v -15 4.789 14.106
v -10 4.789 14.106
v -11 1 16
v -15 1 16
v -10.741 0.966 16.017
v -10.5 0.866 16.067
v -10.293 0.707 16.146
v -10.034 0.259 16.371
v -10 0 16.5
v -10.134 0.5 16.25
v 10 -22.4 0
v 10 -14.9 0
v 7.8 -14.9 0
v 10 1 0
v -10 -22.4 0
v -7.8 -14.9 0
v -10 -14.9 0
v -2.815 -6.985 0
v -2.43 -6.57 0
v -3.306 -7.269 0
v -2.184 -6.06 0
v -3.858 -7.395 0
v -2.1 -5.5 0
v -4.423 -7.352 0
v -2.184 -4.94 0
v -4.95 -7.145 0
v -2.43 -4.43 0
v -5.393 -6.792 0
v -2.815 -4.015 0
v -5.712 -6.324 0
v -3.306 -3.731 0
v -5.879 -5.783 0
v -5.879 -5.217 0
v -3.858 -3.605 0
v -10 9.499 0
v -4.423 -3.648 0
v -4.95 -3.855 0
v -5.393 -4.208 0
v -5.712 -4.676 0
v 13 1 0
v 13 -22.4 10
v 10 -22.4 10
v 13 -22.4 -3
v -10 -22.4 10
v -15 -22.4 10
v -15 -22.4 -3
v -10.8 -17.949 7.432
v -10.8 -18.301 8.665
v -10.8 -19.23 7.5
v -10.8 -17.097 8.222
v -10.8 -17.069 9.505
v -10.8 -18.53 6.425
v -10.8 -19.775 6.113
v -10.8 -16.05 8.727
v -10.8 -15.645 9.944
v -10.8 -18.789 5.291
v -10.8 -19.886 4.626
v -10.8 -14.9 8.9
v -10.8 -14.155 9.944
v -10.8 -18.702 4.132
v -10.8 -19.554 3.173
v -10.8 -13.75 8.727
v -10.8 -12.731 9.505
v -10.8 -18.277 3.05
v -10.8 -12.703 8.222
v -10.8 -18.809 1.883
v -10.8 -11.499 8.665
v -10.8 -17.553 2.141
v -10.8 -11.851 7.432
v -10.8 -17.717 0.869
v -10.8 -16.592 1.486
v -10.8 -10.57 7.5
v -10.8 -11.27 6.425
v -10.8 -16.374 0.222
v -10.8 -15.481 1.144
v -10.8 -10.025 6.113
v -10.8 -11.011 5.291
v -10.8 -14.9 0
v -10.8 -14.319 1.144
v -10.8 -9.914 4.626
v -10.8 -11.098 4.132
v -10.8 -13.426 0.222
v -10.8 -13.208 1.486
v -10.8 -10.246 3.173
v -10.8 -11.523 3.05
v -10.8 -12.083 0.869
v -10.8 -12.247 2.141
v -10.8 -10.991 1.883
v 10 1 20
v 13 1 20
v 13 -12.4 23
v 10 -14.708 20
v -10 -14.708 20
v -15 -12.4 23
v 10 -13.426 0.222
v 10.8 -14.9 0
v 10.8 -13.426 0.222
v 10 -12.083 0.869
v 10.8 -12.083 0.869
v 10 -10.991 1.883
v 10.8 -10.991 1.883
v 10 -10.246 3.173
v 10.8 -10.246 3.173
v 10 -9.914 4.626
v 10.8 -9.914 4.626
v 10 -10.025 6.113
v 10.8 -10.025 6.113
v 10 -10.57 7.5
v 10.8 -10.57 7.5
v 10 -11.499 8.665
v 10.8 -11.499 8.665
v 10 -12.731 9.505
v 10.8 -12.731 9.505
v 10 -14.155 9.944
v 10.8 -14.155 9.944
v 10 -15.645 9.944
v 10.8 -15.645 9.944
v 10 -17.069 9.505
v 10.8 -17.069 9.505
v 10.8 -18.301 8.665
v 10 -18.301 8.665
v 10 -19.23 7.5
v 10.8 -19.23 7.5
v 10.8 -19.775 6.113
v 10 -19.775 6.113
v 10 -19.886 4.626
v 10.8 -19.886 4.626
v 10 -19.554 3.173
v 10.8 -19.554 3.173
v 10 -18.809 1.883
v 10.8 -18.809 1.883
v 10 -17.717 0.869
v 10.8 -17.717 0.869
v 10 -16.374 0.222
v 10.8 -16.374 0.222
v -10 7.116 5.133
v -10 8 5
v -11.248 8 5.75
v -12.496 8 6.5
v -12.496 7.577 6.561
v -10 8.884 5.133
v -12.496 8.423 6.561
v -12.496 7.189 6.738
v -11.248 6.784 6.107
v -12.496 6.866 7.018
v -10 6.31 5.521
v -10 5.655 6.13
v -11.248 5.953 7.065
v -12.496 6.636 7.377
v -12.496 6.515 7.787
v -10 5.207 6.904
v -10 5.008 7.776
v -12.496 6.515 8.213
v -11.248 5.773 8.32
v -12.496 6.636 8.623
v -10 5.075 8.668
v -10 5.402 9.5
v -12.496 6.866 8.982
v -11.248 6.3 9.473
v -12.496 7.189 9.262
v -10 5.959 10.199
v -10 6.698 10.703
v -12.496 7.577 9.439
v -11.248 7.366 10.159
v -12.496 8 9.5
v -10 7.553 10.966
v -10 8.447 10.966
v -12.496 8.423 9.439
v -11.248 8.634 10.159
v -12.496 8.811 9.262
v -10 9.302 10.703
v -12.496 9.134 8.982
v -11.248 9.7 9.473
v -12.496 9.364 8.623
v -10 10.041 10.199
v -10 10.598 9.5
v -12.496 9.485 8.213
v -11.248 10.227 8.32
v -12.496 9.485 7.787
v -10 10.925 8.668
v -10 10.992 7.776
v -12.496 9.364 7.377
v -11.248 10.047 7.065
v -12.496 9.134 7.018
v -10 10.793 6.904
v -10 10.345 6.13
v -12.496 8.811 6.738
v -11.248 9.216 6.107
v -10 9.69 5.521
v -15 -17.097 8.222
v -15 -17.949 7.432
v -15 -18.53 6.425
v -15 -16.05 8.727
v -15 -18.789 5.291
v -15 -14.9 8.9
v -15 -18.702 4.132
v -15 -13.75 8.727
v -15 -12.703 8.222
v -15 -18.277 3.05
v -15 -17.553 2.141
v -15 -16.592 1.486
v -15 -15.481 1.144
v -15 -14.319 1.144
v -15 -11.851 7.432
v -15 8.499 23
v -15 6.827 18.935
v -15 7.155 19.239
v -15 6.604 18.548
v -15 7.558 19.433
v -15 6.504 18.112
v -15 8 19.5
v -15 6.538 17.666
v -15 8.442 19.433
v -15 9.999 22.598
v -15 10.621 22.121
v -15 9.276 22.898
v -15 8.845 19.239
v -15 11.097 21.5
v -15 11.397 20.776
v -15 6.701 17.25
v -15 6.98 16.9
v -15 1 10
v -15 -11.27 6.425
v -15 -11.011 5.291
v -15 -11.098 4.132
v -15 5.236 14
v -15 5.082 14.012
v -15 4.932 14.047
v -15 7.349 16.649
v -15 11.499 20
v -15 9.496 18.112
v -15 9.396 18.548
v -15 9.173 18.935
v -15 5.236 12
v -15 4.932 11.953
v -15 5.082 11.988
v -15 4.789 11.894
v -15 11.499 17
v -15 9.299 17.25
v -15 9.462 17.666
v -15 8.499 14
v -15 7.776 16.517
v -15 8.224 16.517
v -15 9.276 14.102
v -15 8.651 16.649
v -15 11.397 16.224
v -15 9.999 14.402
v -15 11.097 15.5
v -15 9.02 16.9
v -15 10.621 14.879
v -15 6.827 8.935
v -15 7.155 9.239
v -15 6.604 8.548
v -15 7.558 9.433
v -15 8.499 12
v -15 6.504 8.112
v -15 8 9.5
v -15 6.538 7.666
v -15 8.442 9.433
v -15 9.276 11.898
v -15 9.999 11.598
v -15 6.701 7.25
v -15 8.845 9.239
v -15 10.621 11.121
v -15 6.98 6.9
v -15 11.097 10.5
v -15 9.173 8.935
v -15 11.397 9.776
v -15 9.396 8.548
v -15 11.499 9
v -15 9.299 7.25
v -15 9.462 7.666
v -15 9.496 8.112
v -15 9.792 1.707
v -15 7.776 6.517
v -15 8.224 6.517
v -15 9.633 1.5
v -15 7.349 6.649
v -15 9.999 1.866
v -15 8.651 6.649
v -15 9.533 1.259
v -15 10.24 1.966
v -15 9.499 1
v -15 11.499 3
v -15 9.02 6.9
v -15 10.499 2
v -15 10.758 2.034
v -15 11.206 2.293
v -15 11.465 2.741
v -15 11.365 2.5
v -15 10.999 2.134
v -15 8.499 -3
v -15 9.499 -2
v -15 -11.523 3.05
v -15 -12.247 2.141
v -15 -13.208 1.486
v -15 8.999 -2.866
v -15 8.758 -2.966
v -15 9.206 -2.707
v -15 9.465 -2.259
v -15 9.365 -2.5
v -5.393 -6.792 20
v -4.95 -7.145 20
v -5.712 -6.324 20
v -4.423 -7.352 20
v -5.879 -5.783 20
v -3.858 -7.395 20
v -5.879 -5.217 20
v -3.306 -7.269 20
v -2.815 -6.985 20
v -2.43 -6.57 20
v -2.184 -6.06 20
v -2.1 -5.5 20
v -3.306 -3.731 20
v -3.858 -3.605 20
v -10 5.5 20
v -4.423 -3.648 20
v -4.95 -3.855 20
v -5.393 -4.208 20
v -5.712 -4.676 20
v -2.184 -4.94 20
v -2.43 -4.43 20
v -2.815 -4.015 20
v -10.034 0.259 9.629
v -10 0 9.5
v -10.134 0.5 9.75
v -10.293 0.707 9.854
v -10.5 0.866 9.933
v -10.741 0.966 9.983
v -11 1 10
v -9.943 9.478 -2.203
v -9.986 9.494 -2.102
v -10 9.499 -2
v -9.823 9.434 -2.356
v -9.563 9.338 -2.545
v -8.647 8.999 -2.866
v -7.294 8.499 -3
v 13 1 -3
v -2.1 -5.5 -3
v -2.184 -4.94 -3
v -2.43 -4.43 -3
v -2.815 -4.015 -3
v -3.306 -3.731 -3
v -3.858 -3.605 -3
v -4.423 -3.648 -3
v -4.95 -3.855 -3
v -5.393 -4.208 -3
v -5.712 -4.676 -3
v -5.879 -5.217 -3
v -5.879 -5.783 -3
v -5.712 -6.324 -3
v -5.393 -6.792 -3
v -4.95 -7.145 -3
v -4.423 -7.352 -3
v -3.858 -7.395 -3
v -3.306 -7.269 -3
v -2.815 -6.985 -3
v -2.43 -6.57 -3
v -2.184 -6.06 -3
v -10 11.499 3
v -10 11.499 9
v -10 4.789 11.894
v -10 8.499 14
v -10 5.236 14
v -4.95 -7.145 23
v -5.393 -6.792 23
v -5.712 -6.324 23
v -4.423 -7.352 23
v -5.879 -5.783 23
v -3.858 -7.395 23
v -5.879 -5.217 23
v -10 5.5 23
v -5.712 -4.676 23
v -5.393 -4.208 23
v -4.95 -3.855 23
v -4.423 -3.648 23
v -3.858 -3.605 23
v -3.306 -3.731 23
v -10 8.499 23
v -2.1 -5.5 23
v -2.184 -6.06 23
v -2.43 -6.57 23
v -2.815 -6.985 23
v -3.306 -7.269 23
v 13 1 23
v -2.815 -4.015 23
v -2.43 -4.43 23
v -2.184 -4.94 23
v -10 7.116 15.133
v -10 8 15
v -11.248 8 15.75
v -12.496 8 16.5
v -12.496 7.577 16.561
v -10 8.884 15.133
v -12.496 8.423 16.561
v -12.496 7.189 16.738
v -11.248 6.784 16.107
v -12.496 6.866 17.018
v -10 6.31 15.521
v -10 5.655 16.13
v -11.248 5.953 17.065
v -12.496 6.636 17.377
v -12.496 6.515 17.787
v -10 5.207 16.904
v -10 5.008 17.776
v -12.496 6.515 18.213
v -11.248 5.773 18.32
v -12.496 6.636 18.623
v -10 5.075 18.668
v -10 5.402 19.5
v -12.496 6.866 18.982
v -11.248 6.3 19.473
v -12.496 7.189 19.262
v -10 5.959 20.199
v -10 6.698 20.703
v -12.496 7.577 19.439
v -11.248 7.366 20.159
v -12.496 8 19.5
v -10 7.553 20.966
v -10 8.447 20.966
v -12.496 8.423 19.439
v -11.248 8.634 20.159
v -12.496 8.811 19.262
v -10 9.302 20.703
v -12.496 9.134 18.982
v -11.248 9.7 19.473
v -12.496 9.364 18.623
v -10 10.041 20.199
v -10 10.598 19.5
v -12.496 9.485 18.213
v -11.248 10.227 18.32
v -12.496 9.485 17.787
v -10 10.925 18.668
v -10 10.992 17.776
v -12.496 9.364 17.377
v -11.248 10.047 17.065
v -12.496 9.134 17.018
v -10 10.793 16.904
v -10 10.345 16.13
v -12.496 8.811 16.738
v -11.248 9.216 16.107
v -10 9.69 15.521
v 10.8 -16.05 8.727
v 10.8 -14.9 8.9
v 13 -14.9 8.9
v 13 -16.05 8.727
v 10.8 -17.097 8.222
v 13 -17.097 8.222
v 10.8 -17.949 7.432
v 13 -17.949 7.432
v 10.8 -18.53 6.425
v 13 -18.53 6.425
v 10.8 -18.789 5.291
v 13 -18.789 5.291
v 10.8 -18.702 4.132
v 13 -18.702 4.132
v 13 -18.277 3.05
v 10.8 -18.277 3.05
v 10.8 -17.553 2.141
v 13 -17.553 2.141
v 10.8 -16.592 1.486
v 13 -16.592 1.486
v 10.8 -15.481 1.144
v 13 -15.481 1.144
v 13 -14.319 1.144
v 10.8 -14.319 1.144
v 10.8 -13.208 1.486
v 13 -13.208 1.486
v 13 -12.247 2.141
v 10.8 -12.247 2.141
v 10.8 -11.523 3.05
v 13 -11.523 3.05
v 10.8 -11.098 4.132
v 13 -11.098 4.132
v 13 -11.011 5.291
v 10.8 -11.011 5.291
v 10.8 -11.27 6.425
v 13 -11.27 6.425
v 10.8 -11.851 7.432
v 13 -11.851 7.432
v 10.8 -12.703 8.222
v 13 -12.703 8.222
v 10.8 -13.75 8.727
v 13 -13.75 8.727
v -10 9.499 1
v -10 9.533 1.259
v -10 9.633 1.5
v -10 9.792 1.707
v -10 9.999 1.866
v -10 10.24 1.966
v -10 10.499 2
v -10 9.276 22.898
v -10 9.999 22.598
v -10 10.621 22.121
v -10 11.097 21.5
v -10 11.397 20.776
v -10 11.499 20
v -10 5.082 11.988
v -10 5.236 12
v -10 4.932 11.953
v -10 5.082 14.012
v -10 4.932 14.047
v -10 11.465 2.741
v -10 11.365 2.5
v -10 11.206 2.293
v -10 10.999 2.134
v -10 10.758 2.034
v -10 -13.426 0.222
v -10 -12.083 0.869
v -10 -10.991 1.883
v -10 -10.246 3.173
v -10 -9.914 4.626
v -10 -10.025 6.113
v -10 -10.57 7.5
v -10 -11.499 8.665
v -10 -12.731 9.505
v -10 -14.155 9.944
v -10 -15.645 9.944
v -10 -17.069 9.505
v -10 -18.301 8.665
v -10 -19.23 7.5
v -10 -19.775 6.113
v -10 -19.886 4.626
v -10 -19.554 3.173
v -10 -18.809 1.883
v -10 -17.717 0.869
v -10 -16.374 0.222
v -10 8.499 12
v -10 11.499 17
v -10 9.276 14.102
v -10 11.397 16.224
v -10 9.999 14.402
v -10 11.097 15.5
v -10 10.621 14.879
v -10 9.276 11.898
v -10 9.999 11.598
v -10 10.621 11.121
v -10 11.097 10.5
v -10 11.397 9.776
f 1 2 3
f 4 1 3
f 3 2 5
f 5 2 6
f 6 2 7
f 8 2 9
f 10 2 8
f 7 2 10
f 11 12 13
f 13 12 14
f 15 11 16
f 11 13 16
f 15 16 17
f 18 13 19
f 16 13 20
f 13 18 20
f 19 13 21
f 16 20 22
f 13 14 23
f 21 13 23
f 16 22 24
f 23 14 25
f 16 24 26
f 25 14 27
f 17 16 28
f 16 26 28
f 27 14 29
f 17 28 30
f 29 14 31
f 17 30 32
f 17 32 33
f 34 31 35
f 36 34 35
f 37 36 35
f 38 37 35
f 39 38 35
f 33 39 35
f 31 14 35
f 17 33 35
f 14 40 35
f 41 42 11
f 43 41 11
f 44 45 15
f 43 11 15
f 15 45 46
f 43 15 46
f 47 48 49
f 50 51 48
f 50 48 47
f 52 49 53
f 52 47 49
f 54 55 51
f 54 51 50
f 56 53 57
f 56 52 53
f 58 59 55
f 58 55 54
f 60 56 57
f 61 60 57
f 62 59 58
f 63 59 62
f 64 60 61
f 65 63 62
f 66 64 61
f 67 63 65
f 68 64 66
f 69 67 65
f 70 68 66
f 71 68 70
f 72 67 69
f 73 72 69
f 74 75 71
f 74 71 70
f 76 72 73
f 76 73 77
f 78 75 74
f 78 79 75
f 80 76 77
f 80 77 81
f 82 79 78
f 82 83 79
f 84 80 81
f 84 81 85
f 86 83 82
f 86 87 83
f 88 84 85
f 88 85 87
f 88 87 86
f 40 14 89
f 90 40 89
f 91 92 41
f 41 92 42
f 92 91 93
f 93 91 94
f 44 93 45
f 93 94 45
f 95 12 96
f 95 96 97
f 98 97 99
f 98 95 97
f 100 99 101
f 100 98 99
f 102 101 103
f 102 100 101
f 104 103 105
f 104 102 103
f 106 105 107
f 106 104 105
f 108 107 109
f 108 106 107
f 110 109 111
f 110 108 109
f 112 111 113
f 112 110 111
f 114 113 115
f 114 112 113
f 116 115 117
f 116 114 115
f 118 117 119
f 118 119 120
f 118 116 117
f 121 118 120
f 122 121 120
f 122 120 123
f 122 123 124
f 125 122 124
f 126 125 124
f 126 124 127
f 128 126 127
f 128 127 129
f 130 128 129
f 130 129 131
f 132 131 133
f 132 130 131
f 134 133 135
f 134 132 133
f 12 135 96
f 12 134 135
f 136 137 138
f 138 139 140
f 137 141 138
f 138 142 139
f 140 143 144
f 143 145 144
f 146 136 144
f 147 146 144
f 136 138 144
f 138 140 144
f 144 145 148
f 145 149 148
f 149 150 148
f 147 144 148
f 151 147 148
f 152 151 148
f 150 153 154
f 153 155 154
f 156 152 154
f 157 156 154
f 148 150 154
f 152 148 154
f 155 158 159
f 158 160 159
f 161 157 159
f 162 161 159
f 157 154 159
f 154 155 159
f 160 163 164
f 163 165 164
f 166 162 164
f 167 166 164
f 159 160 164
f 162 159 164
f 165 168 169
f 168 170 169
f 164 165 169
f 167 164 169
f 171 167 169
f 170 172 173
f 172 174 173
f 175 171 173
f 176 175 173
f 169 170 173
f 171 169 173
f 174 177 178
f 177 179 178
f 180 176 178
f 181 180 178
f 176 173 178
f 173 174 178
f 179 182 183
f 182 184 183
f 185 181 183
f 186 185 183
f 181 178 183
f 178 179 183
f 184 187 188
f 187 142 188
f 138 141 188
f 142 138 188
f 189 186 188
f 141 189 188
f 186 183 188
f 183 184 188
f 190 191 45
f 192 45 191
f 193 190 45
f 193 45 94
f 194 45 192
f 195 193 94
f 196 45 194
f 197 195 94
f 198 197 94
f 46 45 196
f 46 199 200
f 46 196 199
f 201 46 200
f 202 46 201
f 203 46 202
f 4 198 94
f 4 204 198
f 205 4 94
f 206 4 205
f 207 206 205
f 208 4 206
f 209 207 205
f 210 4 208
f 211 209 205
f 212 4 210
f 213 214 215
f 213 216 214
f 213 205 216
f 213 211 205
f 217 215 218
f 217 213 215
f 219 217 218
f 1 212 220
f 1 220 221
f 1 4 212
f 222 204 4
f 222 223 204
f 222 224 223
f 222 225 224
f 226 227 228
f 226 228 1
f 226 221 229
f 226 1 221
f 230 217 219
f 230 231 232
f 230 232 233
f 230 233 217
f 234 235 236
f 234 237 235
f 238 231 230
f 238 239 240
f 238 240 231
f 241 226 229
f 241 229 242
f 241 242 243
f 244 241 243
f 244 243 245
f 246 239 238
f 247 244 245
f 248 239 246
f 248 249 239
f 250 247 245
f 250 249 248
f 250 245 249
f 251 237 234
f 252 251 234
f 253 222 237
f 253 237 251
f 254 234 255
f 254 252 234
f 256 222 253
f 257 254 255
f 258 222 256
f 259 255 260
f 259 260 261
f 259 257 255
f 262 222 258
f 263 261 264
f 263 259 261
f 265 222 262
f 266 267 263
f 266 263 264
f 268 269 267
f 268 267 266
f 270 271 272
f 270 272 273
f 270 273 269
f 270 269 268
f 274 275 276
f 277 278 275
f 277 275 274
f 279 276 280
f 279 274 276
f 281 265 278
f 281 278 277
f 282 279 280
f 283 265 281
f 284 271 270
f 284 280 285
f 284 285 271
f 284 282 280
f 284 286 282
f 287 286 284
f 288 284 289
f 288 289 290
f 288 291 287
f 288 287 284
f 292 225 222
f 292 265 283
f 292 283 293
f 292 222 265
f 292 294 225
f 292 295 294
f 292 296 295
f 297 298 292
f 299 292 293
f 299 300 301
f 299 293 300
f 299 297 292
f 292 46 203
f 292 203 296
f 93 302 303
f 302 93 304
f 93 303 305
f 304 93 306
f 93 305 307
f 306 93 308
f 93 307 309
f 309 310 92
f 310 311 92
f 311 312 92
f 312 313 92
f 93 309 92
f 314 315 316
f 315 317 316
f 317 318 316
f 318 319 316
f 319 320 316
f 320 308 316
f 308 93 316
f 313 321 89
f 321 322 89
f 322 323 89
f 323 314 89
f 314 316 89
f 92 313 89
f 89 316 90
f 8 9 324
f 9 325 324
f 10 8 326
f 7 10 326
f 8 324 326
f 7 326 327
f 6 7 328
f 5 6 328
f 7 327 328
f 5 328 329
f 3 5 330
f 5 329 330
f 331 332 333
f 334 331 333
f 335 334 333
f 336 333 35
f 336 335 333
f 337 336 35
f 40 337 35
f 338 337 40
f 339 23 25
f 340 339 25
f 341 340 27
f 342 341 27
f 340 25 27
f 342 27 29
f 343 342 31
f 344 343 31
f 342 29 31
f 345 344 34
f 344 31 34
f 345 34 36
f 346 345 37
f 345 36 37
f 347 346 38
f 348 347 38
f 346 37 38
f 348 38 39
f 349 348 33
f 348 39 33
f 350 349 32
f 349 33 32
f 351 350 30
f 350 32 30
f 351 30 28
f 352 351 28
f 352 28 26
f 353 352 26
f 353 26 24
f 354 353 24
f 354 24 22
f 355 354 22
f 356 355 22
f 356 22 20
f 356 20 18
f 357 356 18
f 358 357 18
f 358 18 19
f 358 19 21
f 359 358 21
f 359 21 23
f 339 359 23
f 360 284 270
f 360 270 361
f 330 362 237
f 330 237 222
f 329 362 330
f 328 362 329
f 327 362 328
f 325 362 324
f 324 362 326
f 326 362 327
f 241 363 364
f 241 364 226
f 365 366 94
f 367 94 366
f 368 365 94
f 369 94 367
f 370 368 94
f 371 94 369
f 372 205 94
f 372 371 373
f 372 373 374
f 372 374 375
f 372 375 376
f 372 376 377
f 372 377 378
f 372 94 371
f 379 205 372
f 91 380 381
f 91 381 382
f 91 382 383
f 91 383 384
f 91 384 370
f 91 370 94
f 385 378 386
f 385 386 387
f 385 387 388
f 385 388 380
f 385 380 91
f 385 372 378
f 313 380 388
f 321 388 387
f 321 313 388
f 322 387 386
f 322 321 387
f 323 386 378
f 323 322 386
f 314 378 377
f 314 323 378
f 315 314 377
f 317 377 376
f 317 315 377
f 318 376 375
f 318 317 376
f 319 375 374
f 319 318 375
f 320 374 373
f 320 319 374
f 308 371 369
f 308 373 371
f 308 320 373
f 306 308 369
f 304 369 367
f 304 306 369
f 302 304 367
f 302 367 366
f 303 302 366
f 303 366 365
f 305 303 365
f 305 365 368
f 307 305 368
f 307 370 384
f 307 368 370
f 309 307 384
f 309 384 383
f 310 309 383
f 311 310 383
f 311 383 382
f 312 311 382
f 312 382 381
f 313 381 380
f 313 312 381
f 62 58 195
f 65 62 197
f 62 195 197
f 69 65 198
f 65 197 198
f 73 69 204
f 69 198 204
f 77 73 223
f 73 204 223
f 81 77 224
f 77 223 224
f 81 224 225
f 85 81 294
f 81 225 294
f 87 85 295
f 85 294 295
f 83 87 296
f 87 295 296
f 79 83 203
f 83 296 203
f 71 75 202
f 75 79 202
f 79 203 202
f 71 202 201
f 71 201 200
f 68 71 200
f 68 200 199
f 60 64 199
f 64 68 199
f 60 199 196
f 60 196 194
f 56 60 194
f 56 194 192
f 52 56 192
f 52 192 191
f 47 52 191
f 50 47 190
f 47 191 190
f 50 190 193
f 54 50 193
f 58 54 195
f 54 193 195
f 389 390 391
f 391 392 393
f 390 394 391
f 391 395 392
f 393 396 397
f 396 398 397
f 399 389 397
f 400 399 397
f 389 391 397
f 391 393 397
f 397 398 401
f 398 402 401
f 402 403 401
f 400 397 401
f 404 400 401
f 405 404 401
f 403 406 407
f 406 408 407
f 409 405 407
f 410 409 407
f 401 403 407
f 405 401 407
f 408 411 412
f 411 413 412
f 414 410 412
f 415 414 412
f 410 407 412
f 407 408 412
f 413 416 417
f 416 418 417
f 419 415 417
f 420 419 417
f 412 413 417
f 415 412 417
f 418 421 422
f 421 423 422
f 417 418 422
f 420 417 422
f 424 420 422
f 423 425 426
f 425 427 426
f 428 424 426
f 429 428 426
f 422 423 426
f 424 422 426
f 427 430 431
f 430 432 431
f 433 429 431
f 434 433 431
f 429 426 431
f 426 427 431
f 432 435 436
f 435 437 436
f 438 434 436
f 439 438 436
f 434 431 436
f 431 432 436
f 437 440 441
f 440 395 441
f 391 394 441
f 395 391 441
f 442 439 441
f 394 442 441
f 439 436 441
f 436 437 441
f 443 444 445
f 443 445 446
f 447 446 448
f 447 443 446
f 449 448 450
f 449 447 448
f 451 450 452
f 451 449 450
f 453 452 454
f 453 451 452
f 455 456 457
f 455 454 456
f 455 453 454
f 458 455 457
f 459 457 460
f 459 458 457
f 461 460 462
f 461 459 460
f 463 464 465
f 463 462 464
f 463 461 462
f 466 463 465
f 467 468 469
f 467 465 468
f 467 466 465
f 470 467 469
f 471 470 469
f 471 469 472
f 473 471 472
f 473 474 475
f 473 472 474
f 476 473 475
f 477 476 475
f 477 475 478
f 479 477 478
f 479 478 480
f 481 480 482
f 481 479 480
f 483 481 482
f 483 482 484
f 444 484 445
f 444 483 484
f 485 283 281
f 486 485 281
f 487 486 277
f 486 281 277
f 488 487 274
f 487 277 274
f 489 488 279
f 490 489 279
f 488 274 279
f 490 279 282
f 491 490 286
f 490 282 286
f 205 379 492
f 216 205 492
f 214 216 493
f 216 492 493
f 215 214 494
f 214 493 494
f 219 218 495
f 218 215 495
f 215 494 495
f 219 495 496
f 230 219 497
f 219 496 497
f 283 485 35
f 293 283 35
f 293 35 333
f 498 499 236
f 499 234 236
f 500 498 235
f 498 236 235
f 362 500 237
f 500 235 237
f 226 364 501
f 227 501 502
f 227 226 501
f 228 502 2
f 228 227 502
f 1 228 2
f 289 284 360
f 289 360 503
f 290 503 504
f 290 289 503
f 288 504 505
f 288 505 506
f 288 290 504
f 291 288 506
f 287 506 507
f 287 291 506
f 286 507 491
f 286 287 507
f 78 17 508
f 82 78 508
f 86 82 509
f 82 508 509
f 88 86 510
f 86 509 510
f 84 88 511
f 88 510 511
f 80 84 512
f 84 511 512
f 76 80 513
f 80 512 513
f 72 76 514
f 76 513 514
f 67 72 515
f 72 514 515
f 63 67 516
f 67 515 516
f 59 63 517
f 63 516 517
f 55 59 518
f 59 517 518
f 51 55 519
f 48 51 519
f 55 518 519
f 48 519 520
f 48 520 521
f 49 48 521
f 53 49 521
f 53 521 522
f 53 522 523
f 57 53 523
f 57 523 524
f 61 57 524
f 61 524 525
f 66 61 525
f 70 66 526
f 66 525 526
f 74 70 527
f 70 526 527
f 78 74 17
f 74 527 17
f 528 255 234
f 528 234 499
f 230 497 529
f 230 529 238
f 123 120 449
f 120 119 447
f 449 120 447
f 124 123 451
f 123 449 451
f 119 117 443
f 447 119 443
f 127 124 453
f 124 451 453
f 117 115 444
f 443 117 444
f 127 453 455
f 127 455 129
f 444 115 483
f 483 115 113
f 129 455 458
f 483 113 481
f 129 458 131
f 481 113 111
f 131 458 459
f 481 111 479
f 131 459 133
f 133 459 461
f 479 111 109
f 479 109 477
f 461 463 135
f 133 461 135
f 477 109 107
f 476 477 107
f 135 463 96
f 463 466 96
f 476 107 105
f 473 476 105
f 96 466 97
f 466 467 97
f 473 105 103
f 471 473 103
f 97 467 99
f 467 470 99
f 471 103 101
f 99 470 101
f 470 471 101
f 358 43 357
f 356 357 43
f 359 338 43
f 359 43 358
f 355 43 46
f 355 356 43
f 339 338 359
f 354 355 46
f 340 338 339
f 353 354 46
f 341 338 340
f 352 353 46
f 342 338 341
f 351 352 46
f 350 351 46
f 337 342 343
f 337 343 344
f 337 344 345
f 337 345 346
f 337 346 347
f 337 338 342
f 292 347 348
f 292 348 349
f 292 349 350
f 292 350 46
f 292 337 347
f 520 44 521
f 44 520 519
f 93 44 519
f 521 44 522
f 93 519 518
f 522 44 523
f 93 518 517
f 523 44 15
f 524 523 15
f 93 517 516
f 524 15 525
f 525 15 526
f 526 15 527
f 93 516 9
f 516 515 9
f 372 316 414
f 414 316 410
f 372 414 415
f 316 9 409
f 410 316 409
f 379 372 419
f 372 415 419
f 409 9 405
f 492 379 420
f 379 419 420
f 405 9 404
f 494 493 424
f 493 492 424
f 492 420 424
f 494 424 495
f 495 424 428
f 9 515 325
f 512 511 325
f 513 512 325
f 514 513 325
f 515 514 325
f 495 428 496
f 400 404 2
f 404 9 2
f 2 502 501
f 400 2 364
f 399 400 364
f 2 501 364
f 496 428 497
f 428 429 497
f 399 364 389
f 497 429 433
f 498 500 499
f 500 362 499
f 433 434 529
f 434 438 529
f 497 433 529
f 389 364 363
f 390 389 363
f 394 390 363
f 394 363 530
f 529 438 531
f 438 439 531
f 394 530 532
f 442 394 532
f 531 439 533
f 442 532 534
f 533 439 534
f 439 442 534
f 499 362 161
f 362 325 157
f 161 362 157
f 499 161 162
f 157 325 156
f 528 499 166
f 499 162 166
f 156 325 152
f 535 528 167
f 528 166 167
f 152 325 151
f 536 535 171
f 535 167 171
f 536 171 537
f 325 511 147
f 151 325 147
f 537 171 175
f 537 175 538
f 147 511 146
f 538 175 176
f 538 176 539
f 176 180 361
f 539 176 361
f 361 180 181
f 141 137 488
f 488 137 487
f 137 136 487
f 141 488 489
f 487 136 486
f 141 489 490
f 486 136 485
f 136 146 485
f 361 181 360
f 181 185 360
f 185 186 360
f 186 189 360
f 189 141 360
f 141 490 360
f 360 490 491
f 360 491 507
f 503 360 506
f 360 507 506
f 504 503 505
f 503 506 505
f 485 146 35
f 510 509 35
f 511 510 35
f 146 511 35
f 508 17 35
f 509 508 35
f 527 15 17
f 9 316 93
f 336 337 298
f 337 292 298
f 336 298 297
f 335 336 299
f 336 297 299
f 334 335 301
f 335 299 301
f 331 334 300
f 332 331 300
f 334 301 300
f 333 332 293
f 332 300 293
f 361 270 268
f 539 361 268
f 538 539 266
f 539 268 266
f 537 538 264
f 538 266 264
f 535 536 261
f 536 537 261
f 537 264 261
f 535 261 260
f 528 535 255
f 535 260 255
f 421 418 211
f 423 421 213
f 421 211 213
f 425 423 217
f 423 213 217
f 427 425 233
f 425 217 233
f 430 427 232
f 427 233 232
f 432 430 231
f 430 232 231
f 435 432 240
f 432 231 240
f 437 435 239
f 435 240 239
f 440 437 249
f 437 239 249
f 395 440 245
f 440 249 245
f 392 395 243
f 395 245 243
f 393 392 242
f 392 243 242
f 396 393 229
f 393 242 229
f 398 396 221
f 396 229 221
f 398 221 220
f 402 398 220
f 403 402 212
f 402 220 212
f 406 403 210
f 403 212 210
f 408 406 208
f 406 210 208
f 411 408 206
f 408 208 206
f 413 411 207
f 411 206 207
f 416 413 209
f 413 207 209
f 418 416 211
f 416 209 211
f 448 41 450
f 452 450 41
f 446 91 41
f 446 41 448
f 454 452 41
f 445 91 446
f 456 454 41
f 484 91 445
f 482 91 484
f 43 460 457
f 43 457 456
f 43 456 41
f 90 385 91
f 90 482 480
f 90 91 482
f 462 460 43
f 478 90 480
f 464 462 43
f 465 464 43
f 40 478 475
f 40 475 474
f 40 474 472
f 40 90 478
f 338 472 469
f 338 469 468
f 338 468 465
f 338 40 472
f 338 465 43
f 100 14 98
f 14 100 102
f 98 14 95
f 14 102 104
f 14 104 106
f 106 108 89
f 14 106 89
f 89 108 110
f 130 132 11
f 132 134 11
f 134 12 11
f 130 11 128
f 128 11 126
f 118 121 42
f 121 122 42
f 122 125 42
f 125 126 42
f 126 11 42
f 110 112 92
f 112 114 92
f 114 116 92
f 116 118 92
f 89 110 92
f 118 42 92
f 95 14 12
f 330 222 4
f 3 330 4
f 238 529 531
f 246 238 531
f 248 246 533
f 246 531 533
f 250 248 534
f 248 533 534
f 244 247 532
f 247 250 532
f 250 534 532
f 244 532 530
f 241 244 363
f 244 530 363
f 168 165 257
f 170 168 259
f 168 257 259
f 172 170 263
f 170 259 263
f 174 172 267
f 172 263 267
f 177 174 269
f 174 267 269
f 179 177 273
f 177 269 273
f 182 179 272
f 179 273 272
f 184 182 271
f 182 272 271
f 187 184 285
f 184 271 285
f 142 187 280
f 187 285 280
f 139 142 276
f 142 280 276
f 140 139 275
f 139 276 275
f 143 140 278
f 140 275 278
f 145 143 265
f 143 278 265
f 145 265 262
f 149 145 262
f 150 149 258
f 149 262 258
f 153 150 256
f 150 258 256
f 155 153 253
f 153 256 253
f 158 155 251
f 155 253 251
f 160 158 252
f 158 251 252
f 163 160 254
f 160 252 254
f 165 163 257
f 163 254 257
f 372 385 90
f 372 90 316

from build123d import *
from build123d.topology import SkipClean

# Parameters (mm, degrees)
SKETCH_1_W                = 20
SKETCH_1_H                = 57.76596942167697
EXTRUDE_1_DEPTH           = 3
EXTRUDE_2_DEPTH           = 3
CUT_EXTRUDE_1_DEPTH       = 6
SKETCH_8_R                = 4.48
CUT_EXTRUDE_2_DEPTH       = 0.8
SKETCH_9_R                = 1.9
CUT_EXTRUDE_3_DEPTH       = 3.8
SKETCH_12_W               = 26.000000000000007
SKETCH_12_H               = 35.36596942167698
CUT_EXTRUDE_4_DEPTH       = 36.00000000000001
CUT_EXTRUDE_8_DEPTH       = 28.00000000000001
SKETCH_23_W               = 26.000000000000004
SKETCH_23_H               = 26
SKETCH_23_W_2             = 20
SKETCH_23_H_2             = 19.999999999999993
EXTRUDE_7_DEPTH           = 4
SKETCH_24_W               = 20
SKETCH_24_H               = 19.999999999999993
EXTRUDE_8_DEPTH           = 3
SKETCH_25_W               = 5.000000000000002
SKETCH_25_H               = 16
SKETCH_25_R               = 1.4999999999999991
EXTRUDE_9_DEPTH           = 3
FILLET_1_R                = 1
CUT_EXTRUDE_9_DEPTH       = 3
SKETCH_27_R               = 1.4999999999999987
CUT_EXTRUDE_10_DEPTH      = 3
SKETCH_28_W               = 20
SKETCH_28_H               = 19.999999999999993
CUT_EXTRUDE_11_DEPTH      = 10
CUT_EXTRUDE_12_DEPTH      = 42.00000000000001
SKETCH_31_R               = 4.48
SKETCH_31_R_2             = 3.98
EXTRUDE_13_DEPTH          = 0.8
SKETCH_32_R               = 5.000000000000001
SKETCH_32_R_2             = 3.98
CUT_EXTRUDE_13_DEPTH      = 0.8
SKETCH_33_R               = 4.48
EXTRUDE_14_DEPTH          = 3
SKETCH_36_R               = 5.000000000000001
CUT_EXTRUDE_14_DEPTH      = 3
SKETCH_37_R               = 3.98
SKETCH_37_R_2             = 3.900000000000001
EXTRUDE_17_DEPTH          = 0.8
SKETCH_38_R               = 1.5000000000000009
EXTRUDE_18_DEPTH          = 3
SKETCH_39_W               = 4.187599959799879
SKETCH_39_H               = 1.3608825238343043
EXTRUDE_19_DEPTH          = 3
EXTRUDE_START             = 2
SKETCH_43_R               = 1.5000000000000024
SKETCH_43_R_2             = 1.5000000000000009
SKETCH_43_R_3             = 3.900000000000002
EXTRUDE_22_DEPTH          = 2
SKETCH_44_W               = 5
SKETCH_44_H               = 9.399224841629362
EXTRUDE_23_DEPTH          = 2
EXTRUDE_24_DEPTH          = 3
SKETCH_47_W               = 5
SKETCH_47_H               = 9.399224841629362
EXTRUDE_25_DEPTH          = 8
SKETCH_51_W               = 5
SKETCH_51_H               = 14
SKETCH_51_H_2             = 7.999999999999998
EXTRUDE_28_DEPTH          = 1.1
CUT_EXTRUDE_16_DEPTH      = 6.1000000000000005
FILLET_START              = -16
FILLET_9_DEPTH            = 7
FILLET_START_2            = -15
FILLET_9_2_DEPTH          = 5
EXTRUDE_30_DEPTH          = 3
FILLET_10_R               = 1
SKETCH_57_W               = 5
SKETCH_57_H               = 10.499224841629362
EXTRUDE_31_DEPTH          = 1
SKETCH_58_W               = 5
SKETCH_58_H               = 10.499224841629362
EXTRUDE_32_DEPTH          = 1
FILLET_11_R               = 3
CUT_EXTRUDE_19_DEPTH      = 6.500000000000001
FILLET_14_R               = 1
FILLET_19_R               = 1
HOLE_WIZARD_1_D           = 3
HOLE_WIZARD_1_DEPTH       = 5
HOLE_WIZARD_1_CSINK_D     = 6
HOLE_WIZARD_1_CSINK_ANGLE = 62


with BuildPart() as part:
    # 草图1 → 凸台-拉伸1 (new body)
    with BuildSketch(Plane.XY):
        with Locations((0, -28.882984710838485)):
            Rectangle(SKETCH_1_W, SKETCH_1_H)
    extrude_1 = extrude(amount=-EXTRUDE_1_DEPTH)

    # 草图2 → 凸台-拉伸2 (add)
    with BuildSketch(Plane.ZY.offset(10)):
        Polygon((-3, -1.22e-15), (23, 0), (23.000000000000007, -57.76596942167697), (-3, -57.76596942167697), align=None)
    extrude_2 = extrude(amount=EXTRUDE_2_DEPTH)

    # 草图7 → 切除-拉伸1 (cut)
    with BuildSketch(Plane(origin=(-10, 0, 0), x_dir=(0, 0, -1), z_dir=(1, 0, 0))):
        with BuildLine():
            ThreePointArc((-1.0999999999999996, -14.899999999999997), (-5, -10.999999999999996), (-8.9, -14.899999999999997))
            Line((-8.9, -14.899999999999997), (-1.1000000000000014, -14.899999999999997))
        make_face()
        with BuildLine():
            Line((-1.1000000000000014, -14.899999999999997), (-8.9, -14.899999999999997))
            ThreePointArc((-8.9, -14.899999999999997), (-5.000000000000001, -18.799999999999997), (-1.0999999999999996, -14.899999999999999))
        make_face()
    cut_extrude_1 = extrude(amount=-CUT_EXTRUDE_1_DEPTH, mode=Mode.SUBTRACT)

    # 草图8 → 切除-拉伸2 (cut)
    with BuildSketch(Plane.ZY.offset(13.000000000000002)):
        with Locations((5, -14.899999999999997)):
            Circle(SKETCH_8_R)
    cut_extrude_2 = extrude(amount=-CUT_EXTRUDE_2_DEPTH, mode=Mode.SUBTRACT)

    # 草图9 → 切除-拉伸3 (cut)
    with BuildSketch(Plane.XY):
        with Locations((-4, -5.499999999999998)):
            Circle(SKETCH_9_R)
    cut_extrude_3 = extrude(amount=-CUT_EXTRUDE_3_DEPTH, mode=Mode.SUBTRACT)

    # 镜向1: 凸台-拉伸2 across plane
    add(extrude_2.mirror(Plane(origin=(0, 0, 0), x_dir=(0, 0, 1), z_dir=(1, 0, 0))))

    # 镜向2: 切除-拉伸1, 切除-拉伸2 across plane
    add(cut_extrude_1.mirror(Plane(origin=(0, 0, 0), x_dir=(0, 0, 1), z_dir=(1, 0, 0))), mode=Mode.SUBTRACT)
    add(cut_extrude_2.mirror(Plane(origin=(0, 0, 0), x_dir=(0, 0, 1), z_dir=(1, 0, 0))), mode=Mode.SUBTRACT)

    # 镜向3: 凸台-拉伸1 across plane
    add(extrude_1.mirror(Plane.XY.offset(10)))

    # 镜向5: 切除-拉伸3 across plane
    add(cut_extrude_3.mirror(Plane.XY.offset(10)), mode=Mode.SUBTRACT)

    # 草图12 → 切除-拉伸4 (cut)
    with BuildSketch(Plane(origin=(13.000000000000002, 0, 0), x_dir=(0, 0, -1), z_dir=(1, 0, 0))):
        with Locations((-10.000000000000004, -40.08298471083848)):
            Rectangle(SKETCH_12_W, SKETCH_12_H)
    extrude(amount=-CUT_EXTRUDE_4_DEPTH, mode=Mode.SUBTRACT)

    # 草图22 → 切除-拉伸8 (cut)
    with BuildSketch(Plane(origin=(13.000000000000002, 0, 0), x_dir=(0, 0, -1), z_dir=(1, 0, 0))):
        Polygon((-23.000000000000007, -12.399999999999997), (-23.000000000000007, -22.399999999999995), (-10.000000000000007, -22.399999999999995), align=None)
    extrude(amount=-CUT_EXTRUDE_8_DEPTH, mode=Mode.SUBTRACT)

    # 草图23 → 凸台-拉伸7 (add)
    with BuildSketch(Plane(origin=(0, 0, 0), x_dir=(1, 0, 0), z_dir=(0, 1, 0))):
        with Locations((0, -10)):
            Rectangle(SKETCH_23_W, SKETCH_23_H)
        with Locations((0, -9.999999999999996)):
            Rectangle(SKETCH_23_W_2, SKETCH_23_H_2, mode=Mode.SUBTRACT)
    extrude(amount=EXTRUDE_7_DEPTH)

    # 草图24 → 凸台-拉伸8 (add)
    with BuildSketch(Plane(origin=(0, 4, 0), x_dir=(1, 0, 0), z_dir=(0, 1, 0))):
        with Locations((0, -9.999999999999996)):
            Rectangle(SKETCH_24_W, SKETCH_24_H)
    extrude(amount=-EXTRUDE_8_DEPTH)

    # 草图25 → 凸台-拉伸9 (add)
    with BuildSketch(Plane(origin=(0, 4, 0), x_dir=(1, 0, 0), z_dir=(0, 1, 0))):
        with Locations((15.500000000000004, -15)):
            Rectangle(SKETCH_25_W, SKETCH_25_H)
        with Locations(Location((15.500000000000002, -20.23329325648959, 0), (0, 0, 270))):
            Circle(SKETCH_25_R, mode=Mode.SUBTRACT)
        with Locations(Location((15.500000000000002, -10.23329325648959, 0), (0, 0, 270))):
            Circle(SKETCH_25_R, mode=Mode.SUBTRACT)
    extrude(amount=-EXTRUDE_9_DEPTH)

    # 圆角1
    fillet_1_edges = [part.edges().sort_by_distance(p)[0] for p in [
        (18.000000000000004, 1, 15),
    ]]
    fillet(fillet_1_edges, radius=FILLET_1_R)

    # 草图26 → 切除-拉伸9 (cut)
    with BuildSketch(Plane(origin=(13.000000000000002, 0, 0), x_dir=(0, 0, -1), z_dir=(1, 0, 0))):
        with BuildLine():
            Line((-16, 1.0000000000000004), (-13.999999999999998, 1.0000000000000004))
            ThreePointArc((-13.999999999999998, 1.0000000000000004), (-15, 0), (-16, 1.0000000000000004))
        make_face()
    extrude(amount=-CUT_EXTRUDE_9_DEPTH, mode=Mode.SUBTRACT)

    # 草图27 → 切除-拉伸10 (cut)
    with BuildSketch(Plane(origin=(0, 4, 0), x_dir=(1, 0, 0), z_dir=(0, 1, 0))):
        with Locations(Location((7.500000000000002, -15.233293256489592, 0), (0, 0, 270))):
            Circle(SKETCH_27_R)
    extrude(amount=-CUT_EXTRUDE_10_DEPTH, mode=Mode.SUBTRACT)

    # 草图28 → 切除-拉伸11 (cut)
    with BuildSketch(Plane.XZ.offset(-1)):
        with Locations((0, 9.999999999999996)):
            Rectangle(SKETCH_28_W, SKETCH_28_H)
    extrude(amount=-CUT_EXTRUDE_11_DEPTH, mode=Mode.SUBTRACT)

    # 草图29 → 切除-拉伸12 (cut)
    with BuildSketch(Plane(origin=(0, 0, -3), x_dir=(-1, 0, 0), z_dir=(0, 0, -1))):
        Polygon((13.000000000000002, 4), (-24.68163228941081, 4), (-24.68163228941081, 0.9999999999999957), (13.000000000000002, 1.0000000000000002), align=None)
    extrude(amount=-CUT_EXTRUDE_12_DEPTH, mode=Mode.SUBTRACT)

    # 草图31 → 凸台-拉伸13 (add)
    with BuildSketch(Plane.ZY.offset(12.200000000000001)):
        with Locations((5, -14.899999999999997)):
            Circle(SKETCH_31_R)
        with Locations((5, -14.899999999999997)):
            Circle(SKETCH_31_R_2, mode=Mode.SUBTRACT)
    extrude(amount=EXTRUDE_13_DEPTH)

    # 草图32 → 切除-拉伸13 (cut)
    with BuildSketch(Plane(origin=(-10, 0, 0), x_dir=(0, 0, -1), z_dir=(1, 0, 0))):
        with Locations((-5, -14.899999999999997)):
            Circle(SKETCH_32_R)
        with Locations(Location((-5, -14.899999999999997, 0), (0, 0, 180))):
            Circle(SKETCH_32_R_2, mode=Mode.SUBTRACT)
    cut_extrude_13 = extrude(amount=-CUT_EXTRUDE_13_DEPTH, mode=Mode.SUBTRACT)

    # 草图33 → 凸台-拉伸14 (add)
    with BuildSketch(Plane(origin=(13.000000000000002, 0, 0), x_dir=(0, 0, -1), z_dir=(1, 0, 0))):
        with Locations((-5, -14.899999999999997)):
            Circle(SKETCH_33_R)
    extrude(amount=-EXTRUDE_14_DEPTH)

    # 镜向6: 切除-拉伸1, 切除-拉伸13 across plane
    add(cut_extrude_1.mirror(Plane(origin=(0, 0, 0), x_dir=(0, 0, 1), z_dir=(1, 0, 0))), mode=Mode.SUBTRACT)
    add(cut_extrude_13.mirror(Plane(origin=(0, 0, 0), x_dir=(0, 0, 1), z_dir=(1, 0, 0))), mode=Mode.SUBTRACT)

    # 草图36 → 切除-拉伸14 (cut)
    with BuildSketch(Plane(origin=(-10.8, 0, 0), x_dir=(0, 0, -1), z_dir=(1, 0, 0))):
        with Locations((-5, -14.899999999999997)):
            Circle(SKETCH_36_R)
    cut_extrude_14 = extrude(amount=CUT_EXTRUDE_14_DEPTH, mode=Mode.SUBTRACT)

    # 镜向7: 切除-拉伸14 across plane
    add(cut_extrude_14.mirror(Plane(origin=(0, 0, 0), x_dir=(0, 0, 1), z_dir=(1, 0, 0))), mode=Mode.SUBTRACT)

    # 草图37 → 凸台-拉伸17 (add)
    with SkipClean():  # the faces are left unmerged after this step: merging them gives an invalid solid
        with BuildSketch(Plane.ZY.offset(12.200000000000001)):
            with Locations((5, -14.899999999999997)):
                Circle(SKETCH_37_R)
            with Locations((5, -14.899999999999997)):
                Circle(SKETCH_37_R_2, mode=Mode.SUBTRACT)
        extrude(amount=EXTRUDE_17_DEPTH)

    # 草图38 → 凸台-拉伸18 (add)
    # profile 1 of 2: a face of its own
    with SkipClean():  # the faces are left unmerged after this step: merging them gives an invalid solid
        with BuildSketch(Plane.ZY.offset(13.000000000000002)):
            Polygon((15, 10.399224841629362), (15, 1), (20.999999999999996, 1.0000000000000002), (20.999999999999996, 10.399224841629362), align=None)
            with Locations((18, 8)):
                Circle(SKETCH_38_R, mode=Mode.SUBTRACT)
        # profile 2 of 2: a face of its own
        with BuildSketch(Plane.ZY.offset(13.000000000000002)):
            Polygon((11, 1), (11, 10.399224841629362), (5.000000000000001, 10.399224841629362), (5.000000000000001, 1.0000000000000002), align=None)
            with Locations((8, 8)):
                Circle(SKETCH_38_R, mode=Mode.SUBTRACT)
        extrude(amount=-EXTRUDE_18_DEPTH)

    # 草图39 → 凸台-拉伸19 (add)
    with SkipClean():  # the faces are left unmerged after this step: merging them gives an invalid solid
        with BuildSketch(Plane(origin=(13.000000000000002, 0, 0), x_dir=(0, 0, -1), z_dir=(1, 0, 0))):
            with Locations((-15.28799119011226, 0.3195587380828476)):
                Rectangle(SKETCH_39_W, SKETCH_39_H)
        extrude(amount=-EXTRUDE_19_DEPTH)

    # 草图43 → 凸台-拉伸22 (add)
    with BuildSketch(Plane.ZY.offset(13.000000000000002).offset(EXTRUDE_START)):
        Polygon((-3, 1.0000000000000002), (5.000000000000004, 1.0000000000000002), (5.000000000000001, 10.399224841629362), (11, 10.399224841629362), (11, 1.0000000000000002), (15, 1.0000000000000002), (15, 10.399224841629362), (20.999999999999996, 10.399224841629362), (20.999999999999996, 1.0000000000000002), (23.000000000000007, 1.0000000000000002), (23.000000000000007, -12.399999999999997), (10.000000000000009, -22.399999999999995), (-3, -22.399999999999995), align=None)
        with Locations((8, 8)):
            Circle(SKETCH_43_R, mode=Mode.SUBTRACT)
        with Locations((18, 8)):
            Circle(SKETCH_43_R_2, mode=Mode.SUBTRACT)
        with Locations((5, -14.899999999999997)):
            Circle(SKETCH_43_R_3, mode=Mode.SUBTRACT)
    extrude(amount=-EXTRUDE_22_DEPTH)

    # 草图44 → 凸台-拉伸23 (add)
    with BuildSketch(Plane.XY.offset(20.999999999999996)):
        with Locations((-12.500000000000002, 5.699612420814681)):
            Rectangle(SKETCH_44_W, SKETCH_44_H)
    extrude(amount=EXTRUDE_23_DEPTH)

    # 草图45 → 凸台-拉伸24 (add)
    with BuildSketch(Plane.XY.offset(23)):
        Polygon((-10.000000000000002, 0.9999999999999981), (13.000000000000002, 0.9999999999999943), (-10.000000000000002, 5.499999999999998), align=None)
    extrude(amount=-EXTRUDE_24_DEPTH)

    # 草图47 → 凸台-拉伸25 (add)
    with BuildSketch(Plane(origin=(0, 0, 5.000000000000001), x_dir=(-1, 0, 0), z_dir=(0, 0, -1))):
        with Locations((12.500000000000002, 5.699612420814681)):
            Rectangle(SKETCH_47_W, SKETCH_47_H)
    extrude(amount=EXTRUDE_25_DEPTH)

    # 草图51 → 凸台-拉伸28 (add)
    with BuildSketch(Plane(origin=(0, 10.399224841629362, 0), x_dir=(1, 0, 0), z_dir=(0, 1, 0))):
        with Locations((-12.500000000000002, -4)):
            Rectangle(SKETCH_51_W, SKETCH_51_H)
        with Locations((-12.500000000000002, -19)):
            Rectangle(SKETCH_51_W, SKETCH_51_H_2)
    extrude(amount=EXTRUDE_28_DEPTH)

    # 草图53 → 切除-拉伸16 (cut)
    with BuildSketch(Plane(origin=(-10, 0, 0), x_dir=(0, 0, -1), z_dir=(1, 0, 0))):
        Polygon((2.999999999999999, 11.499224841629362), (-2.000000000000001, 11.499224841629362), (-2.0000000000000004, 9.49922484162936), (2.999999999999999, 9.499224841629362), align=None)
    extrude(amount=-CUT_EXTRUDE_16_DEPTH, mode=Mode.SUBTRACT)

    # 圆角9: read off the stored shape, not the designer's step
    # 圆角9 outline → 圆角9 (cut)
    with BuildSketch(Plane.YZ.offset(FILLET_START)):
        with BuildLine():
            Line((11.499224842, 2), (11.499224842, 3))
            ThreePointArc((11.499224842, 3), (11.206331623, 2.292893219), (10.499224842, 2))
            Line((10.499224842, 2), (11.499224842, 2))
        make_face()
    extrude(amount=FILLET_9_DEPTH, mode=Mode.SUBTRACT)

    # Fillet 9 2 outline → Fillet 9 2 (add)
    with BuildSketch(Plane.YZ.offset(FILLET_START_2)):
        with BuildLine():
            ThreePointArc((9.499224842, 1), (9.79211806, 1.707106782), (10.499224842, 2))
            Line((10.499224842, 2), (9.499224842, 2))
            Line((9.499224842, 2), (9.499224842, 1))
        make_face()
    extrude(amount=FILLET_9_2_DEPTH)

    # 草图54 → 凸台-拉伸30 (add)
    with BuildSketch(Plane(origin=(0, 0, -3), x_dir=(-1, 0, 0), z_dir=(0, 0, -1))):
        Polygon((-13.000000000000002, 0.9999999999999972), (10.000000000000002, 1.0000000000000002), (10, 9.499224841629362), align=None)
    extrude(amount=-EXTRUDE_30_DEPTH)

    # 圆角10
    fillet_10_edges = [part.edges().sort_by_distance(p)[0] for p in [
        (-12.5, 9.499224841629362, -2.999999999999999),
    ]]
    fillet(fillet_10_edges, radius=FILLET_10_R)

    # 草图57 → 凸台-拉伸31 (add)
    with BuildSketch(Plane(origin=(0, 0, 15), x_dir=(-1, 0, 0), z_dir=(0, 0, -1))):
        with Locations((12.500000000000002, 6.249612420814681)):
            Rectangle(SKETCH_57_W, SKETCH_57_H)
    extrude(amount=EXTRUDE_31_DEPTH)

    # 草图58 → 凸台-拉伸32 (add)
    with BuildSketch(Plane.XY.offset(11)):
        with Locations((-12.500000000000002, 6.249612420814681)):
            Rectangle(SKETCH_58_W, SKETCH_58_H)
    extrude(amount=EXTRUDE_32_DEPTH)

    # 圆角11
    # the kernel refuses this fillet: 3 mm, written as the material it takes off along each edge
    with BuildSketch(Plane(origin=(-2.5000000000000018, 11.499224841629362, 23), x_dir=(0, -1, 0), z_dir=(-1, 0, 0)), Plane(origin=(-2.5000000000000018, 11.499224841629362, 14), x_dir=(0, 0, 1), z_dir=(-1, 0, 0))) as fillet_11_piece_1:
        with BuildLine():
            CenterArc((FILLET_11_R, -FILLET_11_R), FILLET_11_R, 90, 90)
            Line((0, -FILLET_11_R), (0, 0))
            Line((0, 0), (FILLET_11_R, 0))
        make_face()
    extrude(amount=20, mode=Mode.SUBTRACT)
    with BuildSketch(Plane(origin=(-22.5, 11.499224841629362, 12), x_dir=(0, -1, 0), z_dir=(1, 0, 0))) as fillet_11_piece_2:
        with BuildLine():
            CenterArc((FILLET_11_R, FILLET_11_R), FILLET_11_R, 180, 90)
            Line((0, FILLET_11_R), (0, 0))
            Line((0, 0), (FILLET_11_R, 0))
        make_face()
    extrude(amount=20, mode=Mode.SUBTRACT)

    # 草图61 → 切除-拉伸19 (cut)
    with BuildSketch(Plane(origin=(-10, 0, 0), x_dir=(0, 0, -1), z_dir=(1, 0, 0))):
        Polygon((-12, 1.0000000000000002), (-12, 5), (-10, 1.0000000000000007), align=None)
        Polygon((-13.999999999999998, 1.0000000000000002), (-13.999999999999998, 5), (-16, 0.9999999999999998), align=None)
    extrude(amount=-CUT_EXTRUDE_19_DEPTH, mode=Mode.SUBTRACT)

    # 圆角14
    fillet_14_edges = [part.edges().sort_by_distance(p)[0] for p in [
        (-10, 1.0000000000000002, 13),
    ]]
    fillet(fillet_14_edges, radius=FILLET_14_R)

    # 圆角19
    fillet_19_edges = [part.edges().sort_by_distance(p)[0] for p in [
        (-12.5, 5, 12),
        (-12.5, 5, 13.999999999999998),
    ]]
    fillet(fillet_19_edges, radius=FILLET_19_R)

    # 打孔尺寸(%根据)内六角花形沉头螺钉的类型1
    with Locations(Plane(origin=(-10, 8, 18), x_dir=(0, 0, 1), z_dir=(1, 0, 0))):
        with Locations((0, 0), (-10, 0)):
            CounterSinkHole(HOLE_WIZARD_1_D / 2, HOLE_WIZARD_1_CSINK_D / 2, depth=HOLE_WIZARD_1_DEPTH, counter_sink_angle=HOLE_WIZARD_1_CSINK_ANGLE)


solid = part.part
